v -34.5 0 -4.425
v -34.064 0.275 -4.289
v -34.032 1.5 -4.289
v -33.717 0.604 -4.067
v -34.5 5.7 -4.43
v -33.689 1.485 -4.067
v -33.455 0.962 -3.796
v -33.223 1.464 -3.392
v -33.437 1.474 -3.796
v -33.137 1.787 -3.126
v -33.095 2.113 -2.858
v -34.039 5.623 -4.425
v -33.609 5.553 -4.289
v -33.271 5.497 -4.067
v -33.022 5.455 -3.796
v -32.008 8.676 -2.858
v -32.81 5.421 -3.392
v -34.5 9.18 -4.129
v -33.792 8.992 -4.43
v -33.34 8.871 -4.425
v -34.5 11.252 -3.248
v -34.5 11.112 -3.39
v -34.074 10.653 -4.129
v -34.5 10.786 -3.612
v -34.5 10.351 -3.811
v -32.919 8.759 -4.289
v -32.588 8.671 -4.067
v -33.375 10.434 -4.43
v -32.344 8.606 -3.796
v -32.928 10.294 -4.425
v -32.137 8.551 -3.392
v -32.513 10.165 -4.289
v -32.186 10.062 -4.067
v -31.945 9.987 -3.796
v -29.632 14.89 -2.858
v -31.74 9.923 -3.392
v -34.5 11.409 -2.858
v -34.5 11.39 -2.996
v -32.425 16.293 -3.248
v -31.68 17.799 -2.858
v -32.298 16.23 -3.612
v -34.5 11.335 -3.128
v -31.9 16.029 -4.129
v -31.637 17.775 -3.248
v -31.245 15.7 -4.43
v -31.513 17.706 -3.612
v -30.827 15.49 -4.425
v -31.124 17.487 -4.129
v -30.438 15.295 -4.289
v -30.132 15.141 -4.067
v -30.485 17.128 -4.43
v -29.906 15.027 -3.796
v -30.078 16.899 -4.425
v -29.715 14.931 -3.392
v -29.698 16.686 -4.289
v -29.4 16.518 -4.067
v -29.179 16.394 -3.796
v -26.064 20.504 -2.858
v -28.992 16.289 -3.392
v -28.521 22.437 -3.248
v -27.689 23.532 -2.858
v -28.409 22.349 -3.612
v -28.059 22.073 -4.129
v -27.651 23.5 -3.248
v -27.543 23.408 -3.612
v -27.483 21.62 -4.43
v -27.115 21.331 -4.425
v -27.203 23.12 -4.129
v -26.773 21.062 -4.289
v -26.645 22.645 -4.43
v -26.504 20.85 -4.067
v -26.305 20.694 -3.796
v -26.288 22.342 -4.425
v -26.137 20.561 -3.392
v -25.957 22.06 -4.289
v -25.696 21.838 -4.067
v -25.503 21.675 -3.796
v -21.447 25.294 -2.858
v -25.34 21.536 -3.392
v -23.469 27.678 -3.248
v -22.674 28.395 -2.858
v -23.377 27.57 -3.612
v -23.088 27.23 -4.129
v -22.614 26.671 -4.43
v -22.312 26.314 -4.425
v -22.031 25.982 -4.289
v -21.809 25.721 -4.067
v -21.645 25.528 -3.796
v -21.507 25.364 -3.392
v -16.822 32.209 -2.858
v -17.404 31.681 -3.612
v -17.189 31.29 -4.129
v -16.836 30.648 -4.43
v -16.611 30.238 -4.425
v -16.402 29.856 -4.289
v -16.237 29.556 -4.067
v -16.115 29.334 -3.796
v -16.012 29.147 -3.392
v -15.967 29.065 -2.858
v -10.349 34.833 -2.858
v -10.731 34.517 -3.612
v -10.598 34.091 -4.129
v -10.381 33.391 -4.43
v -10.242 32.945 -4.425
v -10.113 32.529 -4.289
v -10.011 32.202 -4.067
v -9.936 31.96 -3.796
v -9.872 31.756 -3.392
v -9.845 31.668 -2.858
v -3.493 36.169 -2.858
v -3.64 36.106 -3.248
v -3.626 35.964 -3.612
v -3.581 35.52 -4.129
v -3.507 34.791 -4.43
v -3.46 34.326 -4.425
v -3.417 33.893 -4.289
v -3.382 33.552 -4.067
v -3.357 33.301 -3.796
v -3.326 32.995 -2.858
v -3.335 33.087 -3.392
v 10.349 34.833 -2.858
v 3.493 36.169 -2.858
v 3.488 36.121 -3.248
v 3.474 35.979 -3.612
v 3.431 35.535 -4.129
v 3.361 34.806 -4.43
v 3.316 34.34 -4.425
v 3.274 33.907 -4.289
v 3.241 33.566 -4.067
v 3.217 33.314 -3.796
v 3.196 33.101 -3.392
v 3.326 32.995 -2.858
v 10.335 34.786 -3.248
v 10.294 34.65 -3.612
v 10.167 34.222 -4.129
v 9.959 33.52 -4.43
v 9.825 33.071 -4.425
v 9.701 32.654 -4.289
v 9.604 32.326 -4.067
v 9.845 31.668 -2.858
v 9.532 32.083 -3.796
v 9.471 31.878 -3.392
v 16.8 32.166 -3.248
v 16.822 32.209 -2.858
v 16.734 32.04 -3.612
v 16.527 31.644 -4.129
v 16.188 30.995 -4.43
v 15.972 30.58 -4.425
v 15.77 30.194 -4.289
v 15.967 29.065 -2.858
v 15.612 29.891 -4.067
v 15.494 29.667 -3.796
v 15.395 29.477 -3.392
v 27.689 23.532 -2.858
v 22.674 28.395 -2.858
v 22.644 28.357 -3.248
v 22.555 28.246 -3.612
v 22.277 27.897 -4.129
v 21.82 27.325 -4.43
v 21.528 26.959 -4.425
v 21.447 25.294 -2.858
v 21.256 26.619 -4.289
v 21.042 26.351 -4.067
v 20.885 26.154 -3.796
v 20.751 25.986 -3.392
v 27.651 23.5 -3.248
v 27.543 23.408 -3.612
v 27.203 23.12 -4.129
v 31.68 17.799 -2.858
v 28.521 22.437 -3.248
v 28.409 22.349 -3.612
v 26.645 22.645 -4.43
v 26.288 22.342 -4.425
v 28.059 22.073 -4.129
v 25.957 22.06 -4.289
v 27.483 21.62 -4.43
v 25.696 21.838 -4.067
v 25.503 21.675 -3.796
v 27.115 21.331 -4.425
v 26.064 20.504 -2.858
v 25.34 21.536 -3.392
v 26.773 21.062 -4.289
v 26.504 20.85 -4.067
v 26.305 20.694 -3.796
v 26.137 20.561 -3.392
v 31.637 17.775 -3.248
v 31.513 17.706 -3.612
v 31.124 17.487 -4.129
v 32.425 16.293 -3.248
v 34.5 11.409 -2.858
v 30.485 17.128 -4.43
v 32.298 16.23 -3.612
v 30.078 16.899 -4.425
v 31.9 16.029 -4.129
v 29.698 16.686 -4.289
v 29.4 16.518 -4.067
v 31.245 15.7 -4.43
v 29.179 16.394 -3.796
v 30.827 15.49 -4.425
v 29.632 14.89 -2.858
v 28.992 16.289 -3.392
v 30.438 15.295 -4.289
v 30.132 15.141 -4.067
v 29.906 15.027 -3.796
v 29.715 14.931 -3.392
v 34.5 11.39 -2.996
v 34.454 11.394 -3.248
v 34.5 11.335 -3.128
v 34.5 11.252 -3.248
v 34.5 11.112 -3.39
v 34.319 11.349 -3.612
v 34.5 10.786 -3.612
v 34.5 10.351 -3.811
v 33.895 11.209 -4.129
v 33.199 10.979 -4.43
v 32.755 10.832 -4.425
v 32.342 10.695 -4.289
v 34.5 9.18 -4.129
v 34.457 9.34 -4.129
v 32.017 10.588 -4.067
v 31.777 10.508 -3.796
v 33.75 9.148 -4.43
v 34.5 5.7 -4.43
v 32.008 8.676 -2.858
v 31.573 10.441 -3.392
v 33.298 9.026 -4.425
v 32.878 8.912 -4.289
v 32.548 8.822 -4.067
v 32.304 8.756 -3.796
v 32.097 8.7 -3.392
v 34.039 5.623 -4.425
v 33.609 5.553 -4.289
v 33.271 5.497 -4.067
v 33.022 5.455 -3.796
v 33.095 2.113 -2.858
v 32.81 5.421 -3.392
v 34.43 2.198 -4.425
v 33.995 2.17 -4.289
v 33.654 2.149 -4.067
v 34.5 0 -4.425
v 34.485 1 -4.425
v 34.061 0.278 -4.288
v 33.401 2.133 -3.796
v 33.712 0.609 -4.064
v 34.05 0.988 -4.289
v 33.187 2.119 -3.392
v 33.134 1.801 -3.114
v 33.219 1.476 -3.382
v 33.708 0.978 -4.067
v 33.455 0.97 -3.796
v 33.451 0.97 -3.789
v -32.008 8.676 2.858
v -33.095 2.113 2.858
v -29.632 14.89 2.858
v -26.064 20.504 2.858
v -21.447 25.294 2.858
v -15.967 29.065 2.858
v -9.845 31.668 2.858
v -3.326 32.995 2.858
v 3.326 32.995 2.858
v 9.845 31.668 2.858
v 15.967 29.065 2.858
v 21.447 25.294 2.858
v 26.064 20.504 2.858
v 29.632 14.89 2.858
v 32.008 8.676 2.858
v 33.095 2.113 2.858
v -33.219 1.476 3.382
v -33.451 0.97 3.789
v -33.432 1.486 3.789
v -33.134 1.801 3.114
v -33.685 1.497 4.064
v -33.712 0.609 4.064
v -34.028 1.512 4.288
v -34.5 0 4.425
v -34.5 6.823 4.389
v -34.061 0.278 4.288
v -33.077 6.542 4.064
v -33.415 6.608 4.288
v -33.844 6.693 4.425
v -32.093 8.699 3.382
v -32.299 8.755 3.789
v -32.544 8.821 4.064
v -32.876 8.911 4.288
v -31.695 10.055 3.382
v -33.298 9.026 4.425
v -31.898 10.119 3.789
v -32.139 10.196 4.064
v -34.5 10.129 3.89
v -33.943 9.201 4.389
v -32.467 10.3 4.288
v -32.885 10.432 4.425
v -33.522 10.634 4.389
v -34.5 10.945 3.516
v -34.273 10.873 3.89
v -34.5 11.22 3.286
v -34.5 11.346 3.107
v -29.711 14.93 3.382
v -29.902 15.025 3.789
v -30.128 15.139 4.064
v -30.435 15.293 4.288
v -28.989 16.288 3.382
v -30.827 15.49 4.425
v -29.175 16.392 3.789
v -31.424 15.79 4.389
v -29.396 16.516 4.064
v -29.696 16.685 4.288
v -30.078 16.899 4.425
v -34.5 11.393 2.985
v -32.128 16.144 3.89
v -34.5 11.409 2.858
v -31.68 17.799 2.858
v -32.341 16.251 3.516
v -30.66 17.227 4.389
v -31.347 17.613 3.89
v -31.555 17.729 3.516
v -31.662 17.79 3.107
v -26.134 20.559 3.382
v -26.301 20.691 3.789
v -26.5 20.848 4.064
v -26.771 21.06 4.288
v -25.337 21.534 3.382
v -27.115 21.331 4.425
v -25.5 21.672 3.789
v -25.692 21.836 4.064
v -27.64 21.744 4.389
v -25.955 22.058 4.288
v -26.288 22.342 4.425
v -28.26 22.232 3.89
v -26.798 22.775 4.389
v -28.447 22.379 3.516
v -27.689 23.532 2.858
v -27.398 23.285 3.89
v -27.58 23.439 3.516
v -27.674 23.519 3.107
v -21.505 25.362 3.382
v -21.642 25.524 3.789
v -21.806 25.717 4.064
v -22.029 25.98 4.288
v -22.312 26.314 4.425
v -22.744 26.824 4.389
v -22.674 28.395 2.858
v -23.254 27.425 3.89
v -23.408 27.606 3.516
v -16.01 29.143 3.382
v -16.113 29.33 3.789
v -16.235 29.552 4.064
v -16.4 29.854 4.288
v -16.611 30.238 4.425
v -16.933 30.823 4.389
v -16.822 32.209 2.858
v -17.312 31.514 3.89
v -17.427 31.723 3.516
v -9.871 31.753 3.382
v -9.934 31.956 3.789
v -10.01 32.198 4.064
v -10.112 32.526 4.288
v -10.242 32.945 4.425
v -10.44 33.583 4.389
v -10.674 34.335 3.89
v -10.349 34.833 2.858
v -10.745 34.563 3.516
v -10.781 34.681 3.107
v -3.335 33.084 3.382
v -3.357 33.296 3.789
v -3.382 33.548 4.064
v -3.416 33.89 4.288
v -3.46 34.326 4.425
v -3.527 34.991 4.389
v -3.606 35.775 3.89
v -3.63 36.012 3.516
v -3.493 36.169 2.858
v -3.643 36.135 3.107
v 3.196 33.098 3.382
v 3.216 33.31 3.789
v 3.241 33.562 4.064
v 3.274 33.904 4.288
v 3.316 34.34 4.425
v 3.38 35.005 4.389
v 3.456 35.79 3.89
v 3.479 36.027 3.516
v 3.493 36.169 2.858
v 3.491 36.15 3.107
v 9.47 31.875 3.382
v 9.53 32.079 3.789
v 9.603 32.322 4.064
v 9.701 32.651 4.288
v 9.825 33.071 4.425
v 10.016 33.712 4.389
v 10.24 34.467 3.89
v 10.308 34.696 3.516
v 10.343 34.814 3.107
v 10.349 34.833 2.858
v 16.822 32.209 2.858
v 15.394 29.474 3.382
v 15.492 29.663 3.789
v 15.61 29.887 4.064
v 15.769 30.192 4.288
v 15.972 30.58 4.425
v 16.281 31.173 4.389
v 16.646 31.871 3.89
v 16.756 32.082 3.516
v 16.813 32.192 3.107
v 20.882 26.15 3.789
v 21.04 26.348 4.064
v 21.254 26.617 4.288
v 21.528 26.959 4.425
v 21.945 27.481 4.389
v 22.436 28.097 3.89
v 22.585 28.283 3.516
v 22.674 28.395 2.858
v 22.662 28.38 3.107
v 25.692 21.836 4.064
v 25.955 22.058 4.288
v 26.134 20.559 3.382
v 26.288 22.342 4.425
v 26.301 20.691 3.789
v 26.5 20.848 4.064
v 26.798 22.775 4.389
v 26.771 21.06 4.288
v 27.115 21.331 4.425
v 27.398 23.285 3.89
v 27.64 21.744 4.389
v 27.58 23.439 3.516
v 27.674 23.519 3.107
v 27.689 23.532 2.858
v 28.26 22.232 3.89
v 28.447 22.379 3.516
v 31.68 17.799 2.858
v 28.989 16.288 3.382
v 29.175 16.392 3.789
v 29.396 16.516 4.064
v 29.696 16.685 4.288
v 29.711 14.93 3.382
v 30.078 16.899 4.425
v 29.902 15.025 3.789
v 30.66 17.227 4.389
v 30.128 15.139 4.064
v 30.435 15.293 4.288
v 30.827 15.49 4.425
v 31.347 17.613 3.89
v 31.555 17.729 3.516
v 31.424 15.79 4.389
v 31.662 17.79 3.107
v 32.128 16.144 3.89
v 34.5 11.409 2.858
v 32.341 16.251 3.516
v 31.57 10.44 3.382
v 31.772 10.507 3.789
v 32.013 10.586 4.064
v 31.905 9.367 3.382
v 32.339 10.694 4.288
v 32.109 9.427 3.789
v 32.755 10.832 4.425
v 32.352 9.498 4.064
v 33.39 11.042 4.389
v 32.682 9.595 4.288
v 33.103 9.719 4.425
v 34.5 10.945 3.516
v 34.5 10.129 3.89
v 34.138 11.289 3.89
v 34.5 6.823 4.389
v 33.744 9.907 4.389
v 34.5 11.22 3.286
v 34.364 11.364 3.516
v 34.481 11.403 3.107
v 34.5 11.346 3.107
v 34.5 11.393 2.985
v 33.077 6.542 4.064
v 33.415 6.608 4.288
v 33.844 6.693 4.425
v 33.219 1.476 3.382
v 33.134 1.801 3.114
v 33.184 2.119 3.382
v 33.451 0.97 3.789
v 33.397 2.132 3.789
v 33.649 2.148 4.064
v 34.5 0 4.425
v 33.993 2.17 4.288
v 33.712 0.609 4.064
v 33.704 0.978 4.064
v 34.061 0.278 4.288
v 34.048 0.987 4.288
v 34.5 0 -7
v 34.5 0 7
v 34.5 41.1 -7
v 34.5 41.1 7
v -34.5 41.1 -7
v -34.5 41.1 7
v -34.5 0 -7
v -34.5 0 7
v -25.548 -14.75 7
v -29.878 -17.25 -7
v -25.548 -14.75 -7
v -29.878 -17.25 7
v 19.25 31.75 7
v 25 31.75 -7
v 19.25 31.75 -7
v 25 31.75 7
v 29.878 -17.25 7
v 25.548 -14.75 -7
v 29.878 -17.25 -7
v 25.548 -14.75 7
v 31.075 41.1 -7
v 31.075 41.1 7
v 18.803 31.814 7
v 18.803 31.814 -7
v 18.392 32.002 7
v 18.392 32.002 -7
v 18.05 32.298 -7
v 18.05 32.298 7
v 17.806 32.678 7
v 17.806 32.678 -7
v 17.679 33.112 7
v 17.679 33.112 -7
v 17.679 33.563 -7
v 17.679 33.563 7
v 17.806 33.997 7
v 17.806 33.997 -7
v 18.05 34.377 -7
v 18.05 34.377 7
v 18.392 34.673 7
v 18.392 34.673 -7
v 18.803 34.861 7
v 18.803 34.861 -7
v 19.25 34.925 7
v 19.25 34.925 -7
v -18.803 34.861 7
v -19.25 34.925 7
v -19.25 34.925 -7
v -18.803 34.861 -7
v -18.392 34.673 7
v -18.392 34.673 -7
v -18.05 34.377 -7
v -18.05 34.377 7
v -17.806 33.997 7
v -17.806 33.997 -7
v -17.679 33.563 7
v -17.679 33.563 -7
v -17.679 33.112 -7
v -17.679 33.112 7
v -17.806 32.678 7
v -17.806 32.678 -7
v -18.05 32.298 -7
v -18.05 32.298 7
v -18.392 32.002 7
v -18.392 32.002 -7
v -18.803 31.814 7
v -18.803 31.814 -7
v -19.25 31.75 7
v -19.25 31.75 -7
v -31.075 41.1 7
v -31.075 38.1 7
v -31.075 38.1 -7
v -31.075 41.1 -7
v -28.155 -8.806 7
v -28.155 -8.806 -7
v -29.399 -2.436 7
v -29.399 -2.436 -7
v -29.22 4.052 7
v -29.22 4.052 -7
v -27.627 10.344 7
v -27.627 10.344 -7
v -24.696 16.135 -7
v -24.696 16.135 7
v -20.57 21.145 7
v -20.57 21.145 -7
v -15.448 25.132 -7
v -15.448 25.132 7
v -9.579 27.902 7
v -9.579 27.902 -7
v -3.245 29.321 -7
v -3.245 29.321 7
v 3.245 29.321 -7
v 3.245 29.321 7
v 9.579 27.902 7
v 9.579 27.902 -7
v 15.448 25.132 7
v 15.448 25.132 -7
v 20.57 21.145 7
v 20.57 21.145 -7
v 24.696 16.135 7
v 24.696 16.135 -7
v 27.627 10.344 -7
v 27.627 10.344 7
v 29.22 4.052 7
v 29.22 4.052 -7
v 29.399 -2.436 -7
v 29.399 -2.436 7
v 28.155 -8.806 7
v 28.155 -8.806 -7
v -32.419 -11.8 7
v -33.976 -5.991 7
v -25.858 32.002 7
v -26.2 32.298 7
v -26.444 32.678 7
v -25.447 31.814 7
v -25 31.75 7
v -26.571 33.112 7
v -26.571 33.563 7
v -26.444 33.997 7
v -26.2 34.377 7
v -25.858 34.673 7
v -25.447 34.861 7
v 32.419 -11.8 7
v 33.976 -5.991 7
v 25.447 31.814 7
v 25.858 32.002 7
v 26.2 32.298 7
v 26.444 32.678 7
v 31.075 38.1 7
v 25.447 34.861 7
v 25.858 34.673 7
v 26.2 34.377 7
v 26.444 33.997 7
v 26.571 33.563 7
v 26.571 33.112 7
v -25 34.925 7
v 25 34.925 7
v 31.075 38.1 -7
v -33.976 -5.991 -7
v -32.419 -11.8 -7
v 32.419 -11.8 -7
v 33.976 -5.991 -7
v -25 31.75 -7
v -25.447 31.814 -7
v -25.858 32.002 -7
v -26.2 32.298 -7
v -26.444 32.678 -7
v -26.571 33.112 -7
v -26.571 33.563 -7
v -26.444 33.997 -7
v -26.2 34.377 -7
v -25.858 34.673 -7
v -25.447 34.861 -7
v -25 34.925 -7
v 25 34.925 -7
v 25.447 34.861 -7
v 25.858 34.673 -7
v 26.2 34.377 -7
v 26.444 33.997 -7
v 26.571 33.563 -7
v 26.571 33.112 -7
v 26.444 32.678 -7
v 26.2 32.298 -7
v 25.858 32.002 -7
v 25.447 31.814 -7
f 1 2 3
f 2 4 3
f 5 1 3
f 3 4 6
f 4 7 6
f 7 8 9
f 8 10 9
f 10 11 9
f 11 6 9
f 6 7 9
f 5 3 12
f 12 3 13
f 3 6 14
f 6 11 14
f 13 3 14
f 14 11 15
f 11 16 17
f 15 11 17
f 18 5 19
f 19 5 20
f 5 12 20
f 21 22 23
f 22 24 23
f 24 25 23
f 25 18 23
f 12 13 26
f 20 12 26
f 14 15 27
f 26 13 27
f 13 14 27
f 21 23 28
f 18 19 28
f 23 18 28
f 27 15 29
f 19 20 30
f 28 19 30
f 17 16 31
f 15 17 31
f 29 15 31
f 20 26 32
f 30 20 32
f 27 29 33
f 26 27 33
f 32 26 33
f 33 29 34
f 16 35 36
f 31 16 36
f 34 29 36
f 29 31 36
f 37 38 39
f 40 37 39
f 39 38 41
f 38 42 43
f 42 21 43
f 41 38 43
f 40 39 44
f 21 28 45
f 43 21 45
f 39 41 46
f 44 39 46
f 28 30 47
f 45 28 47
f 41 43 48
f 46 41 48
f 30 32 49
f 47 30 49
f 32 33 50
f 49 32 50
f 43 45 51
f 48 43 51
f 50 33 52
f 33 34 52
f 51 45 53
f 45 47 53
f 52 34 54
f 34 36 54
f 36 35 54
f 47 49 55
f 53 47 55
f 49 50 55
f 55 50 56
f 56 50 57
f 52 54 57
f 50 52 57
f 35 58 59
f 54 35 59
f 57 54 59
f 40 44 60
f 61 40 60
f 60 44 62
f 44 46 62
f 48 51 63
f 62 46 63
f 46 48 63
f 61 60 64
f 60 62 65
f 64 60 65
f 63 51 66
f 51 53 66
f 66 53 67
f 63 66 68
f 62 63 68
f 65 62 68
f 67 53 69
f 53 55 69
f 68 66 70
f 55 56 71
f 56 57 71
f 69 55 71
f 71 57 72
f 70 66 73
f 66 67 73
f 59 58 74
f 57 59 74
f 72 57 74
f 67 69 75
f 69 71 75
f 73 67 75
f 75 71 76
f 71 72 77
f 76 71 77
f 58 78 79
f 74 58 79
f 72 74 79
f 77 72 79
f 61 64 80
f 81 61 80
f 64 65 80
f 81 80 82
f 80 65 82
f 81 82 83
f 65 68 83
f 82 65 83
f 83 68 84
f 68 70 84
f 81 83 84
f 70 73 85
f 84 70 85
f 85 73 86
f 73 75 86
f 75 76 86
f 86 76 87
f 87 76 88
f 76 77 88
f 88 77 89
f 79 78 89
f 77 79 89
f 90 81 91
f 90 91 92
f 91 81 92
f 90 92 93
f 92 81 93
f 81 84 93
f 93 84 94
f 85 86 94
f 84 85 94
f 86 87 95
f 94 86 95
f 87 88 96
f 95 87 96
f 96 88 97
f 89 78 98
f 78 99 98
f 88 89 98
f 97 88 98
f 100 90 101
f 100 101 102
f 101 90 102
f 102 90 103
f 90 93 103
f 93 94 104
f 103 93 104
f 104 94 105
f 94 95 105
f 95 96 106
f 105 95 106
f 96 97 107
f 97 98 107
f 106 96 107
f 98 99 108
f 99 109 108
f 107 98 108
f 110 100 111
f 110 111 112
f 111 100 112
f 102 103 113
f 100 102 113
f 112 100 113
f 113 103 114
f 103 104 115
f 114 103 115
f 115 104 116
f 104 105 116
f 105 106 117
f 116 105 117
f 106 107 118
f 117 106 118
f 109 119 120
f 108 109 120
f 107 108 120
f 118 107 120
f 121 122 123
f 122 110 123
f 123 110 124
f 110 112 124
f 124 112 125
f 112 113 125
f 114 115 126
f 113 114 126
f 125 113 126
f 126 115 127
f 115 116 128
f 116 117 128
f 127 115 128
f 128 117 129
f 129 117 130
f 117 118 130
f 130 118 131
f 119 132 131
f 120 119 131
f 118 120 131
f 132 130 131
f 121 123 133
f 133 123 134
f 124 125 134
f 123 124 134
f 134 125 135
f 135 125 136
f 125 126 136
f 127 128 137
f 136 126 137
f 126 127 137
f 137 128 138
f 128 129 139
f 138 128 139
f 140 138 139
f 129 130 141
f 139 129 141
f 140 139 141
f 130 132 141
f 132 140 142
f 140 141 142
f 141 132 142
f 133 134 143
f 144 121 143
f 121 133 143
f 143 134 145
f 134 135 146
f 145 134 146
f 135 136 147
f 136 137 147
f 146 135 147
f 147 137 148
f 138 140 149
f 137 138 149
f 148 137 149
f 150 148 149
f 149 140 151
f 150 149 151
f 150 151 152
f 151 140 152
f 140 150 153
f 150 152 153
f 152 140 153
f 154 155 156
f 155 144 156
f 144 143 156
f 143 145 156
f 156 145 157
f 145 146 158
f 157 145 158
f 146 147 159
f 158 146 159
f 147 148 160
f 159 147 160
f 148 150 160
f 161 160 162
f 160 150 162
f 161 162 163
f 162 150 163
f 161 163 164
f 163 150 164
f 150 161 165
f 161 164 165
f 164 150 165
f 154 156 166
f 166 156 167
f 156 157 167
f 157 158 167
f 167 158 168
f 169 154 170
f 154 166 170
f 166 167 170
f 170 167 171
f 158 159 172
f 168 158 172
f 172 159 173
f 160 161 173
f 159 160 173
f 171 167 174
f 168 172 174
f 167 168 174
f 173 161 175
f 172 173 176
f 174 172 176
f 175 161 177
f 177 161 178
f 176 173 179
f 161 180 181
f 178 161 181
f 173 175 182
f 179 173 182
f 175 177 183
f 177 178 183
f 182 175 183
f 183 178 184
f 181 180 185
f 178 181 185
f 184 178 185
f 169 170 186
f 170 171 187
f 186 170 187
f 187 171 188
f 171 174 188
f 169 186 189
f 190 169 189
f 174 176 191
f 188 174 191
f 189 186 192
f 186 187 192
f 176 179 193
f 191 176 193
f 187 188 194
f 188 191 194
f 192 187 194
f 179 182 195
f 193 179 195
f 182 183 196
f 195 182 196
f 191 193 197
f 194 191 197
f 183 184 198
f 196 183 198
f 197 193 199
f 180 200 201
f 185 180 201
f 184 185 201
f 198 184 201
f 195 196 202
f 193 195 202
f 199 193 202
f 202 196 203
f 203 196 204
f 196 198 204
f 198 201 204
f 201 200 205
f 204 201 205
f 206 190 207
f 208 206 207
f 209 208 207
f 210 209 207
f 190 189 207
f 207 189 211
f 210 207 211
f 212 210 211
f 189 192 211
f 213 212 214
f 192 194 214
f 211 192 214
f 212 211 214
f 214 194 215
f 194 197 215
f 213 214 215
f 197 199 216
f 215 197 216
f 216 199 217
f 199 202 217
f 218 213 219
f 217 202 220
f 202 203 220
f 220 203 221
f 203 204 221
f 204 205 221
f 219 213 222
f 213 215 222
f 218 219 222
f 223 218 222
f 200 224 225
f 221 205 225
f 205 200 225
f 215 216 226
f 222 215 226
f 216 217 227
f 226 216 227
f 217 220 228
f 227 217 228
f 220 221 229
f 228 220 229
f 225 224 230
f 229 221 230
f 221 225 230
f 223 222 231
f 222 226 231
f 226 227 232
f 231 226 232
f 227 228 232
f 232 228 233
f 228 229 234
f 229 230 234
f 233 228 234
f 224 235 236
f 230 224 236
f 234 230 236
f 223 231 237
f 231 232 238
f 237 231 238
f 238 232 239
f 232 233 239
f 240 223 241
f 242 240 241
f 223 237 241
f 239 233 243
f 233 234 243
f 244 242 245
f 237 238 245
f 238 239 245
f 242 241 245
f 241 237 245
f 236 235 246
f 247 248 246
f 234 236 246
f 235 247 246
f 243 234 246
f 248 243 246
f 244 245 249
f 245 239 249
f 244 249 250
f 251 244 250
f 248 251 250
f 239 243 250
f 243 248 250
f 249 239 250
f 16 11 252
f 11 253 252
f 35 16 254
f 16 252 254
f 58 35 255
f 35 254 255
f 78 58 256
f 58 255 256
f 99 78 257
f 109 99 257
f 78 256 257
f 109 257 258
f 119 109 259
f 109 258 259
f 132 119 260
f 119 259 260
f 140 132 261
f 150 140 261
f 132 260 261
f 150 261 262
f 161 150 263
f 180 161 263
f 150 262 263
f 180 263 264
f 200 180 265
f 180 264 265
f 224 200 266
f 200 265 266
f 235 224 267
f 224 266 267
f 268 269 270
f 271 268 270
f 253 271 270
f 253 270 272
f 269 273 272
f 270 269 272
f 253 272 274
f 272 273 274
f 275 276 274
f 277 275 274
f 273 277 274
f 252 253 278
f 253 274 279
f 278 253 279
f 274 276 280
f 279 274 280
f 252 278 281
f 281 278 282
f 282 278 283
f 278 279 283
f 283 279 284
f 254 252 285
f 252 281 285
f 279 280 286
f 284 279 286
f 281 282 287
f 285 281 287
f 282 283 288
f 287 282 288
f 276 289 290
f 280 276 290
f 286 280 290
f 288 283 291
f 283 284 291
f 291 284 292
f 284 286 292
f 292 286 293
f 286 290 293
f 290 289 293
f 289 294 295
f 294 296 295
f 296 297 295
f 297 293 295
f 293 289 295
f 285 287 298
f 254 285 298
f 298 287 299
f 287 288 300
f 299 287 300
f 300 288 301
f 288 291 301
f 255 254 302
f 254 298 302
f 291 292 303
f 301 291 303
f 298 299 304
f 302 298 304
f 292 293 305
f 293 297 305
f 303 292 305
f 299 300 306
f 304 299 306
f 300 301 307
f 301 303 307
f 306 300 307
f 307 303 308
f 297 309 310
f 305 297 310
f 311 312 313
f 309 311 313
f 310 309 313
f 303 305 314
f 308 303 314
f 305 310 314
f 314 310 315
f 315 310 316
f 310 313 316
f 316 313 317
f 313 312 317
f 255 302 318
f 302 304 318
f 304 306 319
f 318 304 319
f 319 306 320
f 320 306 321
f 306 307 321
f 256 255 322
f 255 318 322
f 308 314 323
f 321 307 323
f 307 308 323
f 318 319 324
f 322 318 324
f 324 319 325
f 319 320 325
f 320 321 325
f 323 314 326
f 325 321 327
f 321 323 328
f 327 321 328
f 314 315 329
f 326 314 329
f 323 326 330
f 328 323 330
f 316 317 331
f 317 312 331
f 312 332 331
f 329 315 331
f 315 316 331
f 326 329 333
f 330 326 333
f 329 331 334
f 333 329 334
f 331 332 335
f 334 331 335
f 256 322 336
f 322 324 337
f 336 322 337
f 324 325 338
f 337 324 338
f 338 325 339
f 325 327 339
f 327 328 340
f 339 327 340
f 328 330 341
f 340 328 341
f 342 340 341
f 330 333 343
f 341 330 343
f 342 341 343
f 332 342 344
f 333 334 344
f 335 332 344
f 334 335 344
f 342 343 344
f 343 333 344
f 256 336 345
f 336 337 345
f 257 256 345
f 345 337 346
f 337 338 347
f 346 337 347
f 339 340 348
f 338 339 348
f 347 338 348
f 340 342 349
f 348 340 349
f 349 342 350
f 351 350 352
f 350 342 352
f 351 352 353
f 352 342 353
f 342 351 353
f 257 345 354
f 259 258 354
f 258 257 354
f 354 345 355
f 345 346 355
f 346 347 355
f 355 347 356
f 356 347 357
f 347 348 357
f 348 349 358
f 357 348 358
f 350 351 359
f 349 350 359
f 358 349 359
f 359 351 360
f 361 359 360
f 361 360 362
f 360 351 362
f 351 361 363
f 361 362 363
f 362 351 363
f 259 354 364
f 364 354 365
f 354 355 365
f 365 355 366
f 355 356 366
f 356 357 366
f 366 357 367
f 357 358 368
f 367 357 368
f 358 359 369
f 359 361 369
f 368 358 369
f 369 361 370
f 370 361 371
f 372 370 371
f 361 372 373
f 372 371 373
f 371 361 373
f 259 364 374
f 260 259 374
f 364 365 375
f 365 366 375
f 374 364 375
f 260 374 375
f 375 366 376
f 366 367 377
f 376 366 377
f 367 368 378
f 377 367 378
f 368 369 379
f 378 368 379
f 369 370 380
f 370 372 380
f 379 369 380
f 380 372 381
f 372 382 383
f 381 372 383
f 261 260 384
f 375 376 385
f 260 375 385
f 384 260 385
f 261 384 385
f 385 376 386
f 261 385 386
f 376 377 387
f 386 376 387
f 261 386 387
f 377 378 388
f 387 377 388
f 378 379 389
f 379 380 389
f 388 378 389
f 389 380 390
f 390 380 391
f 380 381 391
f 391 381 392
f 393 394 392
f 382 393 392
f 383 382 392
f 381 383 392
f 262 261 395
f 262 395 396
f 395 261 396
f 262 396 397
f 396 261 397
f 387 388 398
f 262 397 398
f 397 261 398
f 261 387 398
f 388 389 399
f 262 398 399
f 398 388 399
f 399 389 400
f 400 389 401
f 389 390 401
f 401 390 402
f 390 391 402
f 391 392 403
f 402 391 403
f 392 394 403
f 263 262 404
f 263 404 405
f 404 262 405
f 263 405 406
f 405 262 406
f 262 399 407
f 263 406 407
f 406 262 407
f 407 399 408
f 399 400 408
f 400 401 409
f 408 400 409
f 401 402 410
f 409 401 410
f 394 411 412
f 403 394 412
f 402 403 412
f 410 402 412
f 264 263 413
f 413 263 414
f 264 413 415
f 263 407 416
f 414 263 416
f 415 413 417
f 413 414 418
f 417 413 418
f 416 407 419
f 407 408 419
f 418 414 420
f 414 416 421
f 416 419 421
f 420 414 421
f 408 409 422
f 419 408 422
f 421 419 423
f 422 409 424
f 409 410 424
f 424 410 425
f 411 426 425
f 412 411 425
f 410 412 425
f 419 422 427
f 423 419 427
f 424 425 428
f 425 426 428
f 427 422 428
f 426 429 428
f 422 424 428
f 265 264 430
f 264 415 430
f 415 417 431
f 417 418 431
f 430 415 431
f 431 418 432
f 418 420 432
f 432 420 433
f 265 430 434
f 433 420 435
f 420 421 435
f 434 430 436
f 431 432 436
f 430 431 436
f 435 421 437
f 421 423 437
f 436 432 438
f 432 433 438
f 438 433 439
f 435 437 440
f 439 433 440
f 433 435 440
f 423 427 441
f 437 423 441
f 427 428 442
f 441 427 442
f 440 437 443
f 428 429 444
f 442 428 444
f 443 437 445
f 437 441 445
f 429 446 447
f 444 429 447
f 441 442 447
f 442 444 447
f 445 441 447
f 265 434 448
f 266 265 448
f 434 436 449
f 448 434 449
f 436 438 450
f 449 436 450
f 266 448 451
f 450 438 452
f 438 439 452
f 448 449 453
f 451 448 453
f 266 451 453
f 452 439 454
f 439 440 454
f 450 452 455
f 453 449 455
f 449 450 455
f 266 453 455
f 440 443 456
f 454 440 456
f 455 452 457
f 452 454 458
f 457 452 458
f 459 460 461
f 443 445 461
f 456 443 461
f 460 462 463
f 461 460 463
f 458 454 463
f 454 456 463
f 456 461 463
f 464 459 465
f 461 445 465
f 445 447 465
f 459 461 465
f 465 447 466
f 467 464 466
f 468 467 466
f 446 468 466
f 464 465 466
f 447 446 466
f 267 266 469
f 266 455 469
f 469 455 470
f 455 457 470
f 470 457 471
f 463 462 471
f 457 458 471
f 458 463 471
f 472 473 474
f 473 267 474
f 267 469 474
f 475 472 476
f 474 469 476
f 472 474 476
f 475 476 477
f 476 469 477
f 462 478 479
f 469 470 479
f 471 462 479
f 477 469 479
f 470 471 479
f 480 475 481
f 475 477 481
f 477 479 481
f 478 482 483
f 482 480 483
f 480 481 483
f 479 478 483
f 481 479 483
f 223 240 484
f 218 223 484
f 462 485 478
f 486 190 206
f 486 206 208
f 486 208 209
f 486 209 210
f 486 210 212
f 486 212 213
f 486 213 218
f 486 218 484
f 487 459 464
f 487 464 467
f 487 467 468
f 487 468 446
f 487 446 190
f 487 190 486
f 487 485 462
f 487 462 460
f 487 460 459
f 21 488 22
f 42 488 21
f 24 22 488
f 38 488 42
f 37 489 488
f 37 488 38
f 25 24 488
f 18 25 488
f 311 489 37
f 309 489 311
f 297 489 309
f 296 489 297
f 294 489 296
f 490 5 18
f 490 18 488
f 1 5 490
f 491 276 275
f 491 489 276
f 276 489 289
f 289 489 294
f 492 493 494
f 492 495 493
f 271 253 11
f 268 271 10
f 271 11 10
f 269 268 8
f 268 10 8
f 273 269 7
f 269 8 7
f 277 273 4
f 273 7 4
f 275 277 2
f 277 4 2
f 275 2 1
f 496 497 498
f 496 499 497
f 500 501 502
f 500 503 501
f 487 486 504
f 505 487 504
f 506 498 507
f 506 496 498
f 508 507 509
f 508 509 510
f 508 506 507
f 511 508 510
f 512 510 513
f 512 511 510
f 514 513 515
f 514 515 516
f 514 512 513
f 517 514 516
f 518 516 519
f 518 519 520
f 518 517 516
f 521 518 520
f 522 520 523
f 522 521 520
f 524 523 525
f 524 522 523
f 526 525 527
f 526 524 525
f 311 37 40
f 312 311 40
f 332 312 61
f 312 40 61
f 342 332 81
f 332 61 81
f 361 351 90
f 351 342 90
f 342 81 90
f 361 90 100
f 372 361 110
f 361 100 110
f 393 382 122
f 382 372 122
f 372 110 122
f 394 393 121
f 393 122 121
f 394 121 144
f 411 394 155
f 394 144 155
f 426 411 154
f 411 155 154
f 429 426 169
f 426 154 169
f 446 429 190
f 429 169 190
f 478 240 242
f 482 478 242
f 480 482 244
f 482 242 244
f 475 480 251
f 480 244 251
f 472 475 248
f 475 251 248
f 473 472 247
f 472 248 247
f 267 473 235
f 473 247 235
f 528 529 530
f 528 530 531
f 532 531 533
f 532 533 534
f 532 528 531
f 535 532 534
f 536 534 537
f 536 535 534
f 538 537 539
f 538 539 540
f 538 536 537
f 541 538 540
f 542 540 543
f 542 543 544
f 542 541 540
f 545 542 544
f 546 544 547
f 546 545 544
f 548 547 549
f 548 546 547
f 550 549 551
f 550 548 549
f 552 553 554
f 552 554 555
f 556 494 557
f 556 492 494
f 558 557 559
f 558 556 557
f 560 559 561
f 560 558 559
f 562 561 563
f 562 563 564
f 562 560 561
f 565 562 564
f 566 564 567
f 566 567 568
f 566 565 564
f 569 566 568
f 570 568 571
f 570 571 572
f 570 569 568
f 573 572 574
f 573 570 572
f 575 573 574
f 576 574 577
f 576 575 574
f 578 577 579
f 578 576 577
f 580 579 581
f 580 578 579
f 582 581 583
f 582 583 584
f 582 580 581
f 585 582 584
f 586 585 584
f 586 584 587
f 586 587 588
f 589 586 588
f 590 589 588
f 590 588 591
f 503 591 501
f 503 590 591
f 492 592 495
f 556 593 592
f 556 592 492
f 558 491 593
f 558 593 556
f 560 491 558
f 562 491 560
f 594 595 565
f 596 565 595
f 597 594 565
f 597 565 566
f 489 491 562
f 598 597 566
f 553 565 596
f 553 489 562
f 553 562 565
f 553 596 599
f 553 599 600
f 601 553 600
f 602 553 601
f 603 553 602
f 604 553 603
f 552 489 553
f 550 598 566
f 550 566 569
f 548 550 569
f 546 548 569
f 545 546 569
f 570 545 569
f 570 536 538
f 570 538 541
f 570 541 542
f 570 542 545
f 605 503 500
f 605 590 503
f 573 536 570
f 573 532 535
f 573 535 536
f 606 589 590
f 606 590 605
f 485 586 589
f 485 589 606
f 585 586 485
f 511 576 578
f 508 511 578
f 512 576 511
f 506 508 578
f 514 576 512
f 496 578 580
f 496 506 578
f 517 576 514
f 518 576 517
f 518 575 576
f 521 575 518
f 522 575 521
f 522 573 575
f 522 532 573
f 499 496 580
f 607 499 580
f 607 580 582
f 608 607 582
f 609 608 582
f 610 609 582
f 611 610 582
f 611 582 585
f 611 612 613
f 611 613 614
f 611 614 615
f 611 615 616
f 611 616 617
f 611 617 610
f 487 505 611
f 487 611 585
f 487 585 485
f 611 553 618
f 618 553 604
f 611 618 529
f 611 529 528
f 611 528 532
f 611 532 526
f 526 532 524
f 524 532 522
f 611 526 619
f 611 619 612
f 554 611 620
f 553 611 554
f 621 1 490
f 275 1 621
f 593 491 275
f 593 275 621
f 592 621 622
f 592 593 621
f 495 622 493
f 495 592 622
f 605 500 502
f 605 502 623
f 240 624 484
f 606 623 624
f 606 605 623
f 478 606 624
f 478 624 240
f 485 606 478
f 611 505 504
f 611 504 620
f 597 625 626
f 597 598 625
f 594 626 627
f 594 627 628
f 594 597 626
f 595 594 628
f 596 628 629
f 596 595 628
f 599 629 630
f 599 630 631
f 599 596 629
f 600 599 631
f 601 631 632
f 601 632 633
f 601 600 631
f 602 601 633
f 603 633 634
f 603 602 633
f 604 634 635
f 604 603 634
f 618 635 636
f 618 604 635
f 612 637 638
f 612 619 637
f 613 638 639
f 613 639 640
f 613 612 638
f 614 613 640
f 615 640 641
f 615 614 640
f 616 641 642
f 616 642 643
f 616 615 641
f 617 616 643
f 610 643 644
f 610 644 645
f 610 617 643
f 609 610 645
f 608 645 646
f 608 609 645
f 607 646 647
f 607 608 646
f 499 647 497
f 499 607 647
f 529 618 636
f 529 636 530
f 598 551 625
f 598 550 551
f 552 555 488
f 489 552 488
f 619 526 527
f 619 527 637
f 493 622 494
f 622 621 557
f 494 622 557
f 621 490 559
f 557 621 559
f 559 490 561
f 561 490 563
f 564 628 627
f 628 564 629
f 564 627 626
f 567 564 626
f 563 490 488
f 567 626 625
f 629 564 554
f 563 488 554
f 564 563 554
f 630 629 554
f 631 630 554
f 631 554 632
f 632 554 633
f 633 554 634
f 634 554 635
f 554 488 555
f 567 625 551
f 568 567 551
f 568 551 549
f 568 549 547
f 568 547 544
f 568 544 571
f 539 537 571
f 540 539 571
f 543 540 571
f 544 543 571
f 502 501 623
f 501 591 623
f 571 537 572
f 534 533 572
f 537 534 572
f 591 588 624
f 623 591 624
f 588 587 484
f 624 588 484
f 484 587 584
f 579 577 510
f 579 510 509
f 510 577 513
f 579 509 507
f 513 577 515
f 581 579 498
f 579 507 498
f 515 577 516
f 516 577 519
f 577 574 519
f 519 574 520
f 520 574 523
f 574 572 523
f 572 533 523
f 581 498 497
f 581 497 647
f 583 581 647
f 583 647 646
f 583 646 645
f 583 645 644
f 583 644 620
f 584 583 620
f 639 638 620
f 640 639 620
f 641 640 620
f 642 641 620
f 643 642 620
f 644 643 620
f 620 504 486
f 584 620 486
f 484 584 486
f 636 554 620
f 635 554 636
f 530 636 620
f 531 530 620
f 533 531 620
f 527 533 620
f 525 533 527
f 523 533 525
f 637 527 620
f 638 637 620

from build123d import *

# Parameters (mm, degrees)
BOSS_EXTRUDE2_DEPTH      = 7
CORTAR_REVOLUCI_N1_ANGLE = 180
REDONDEO1_START          = -5
REDONDEO1_DEPTH          = 10


with BuildPart() as part:
    # Sketch1 → Boss-Extrude2 (new, symmetric)
    with BuildSketch(Plane.XY):
        with BuildLine():
            Line((25.547749412, -14.75), (29.877876431, -17.25))
            ThreePointArc((29.877876431, -17.25), (33.324441007, -8.929257056), (34.5, 0))
            Line((34.5, 0), (34.5, 41.1))
            Line((34.5, 41.1), (31.075, 41.1))
            Line((31.075, 41.1), (31.075, 38.1))
            Line((31.075, 38.1), (-31.075, 38.1))
            Line((-31.075, 38.1), (-31.075, 41.1))
            Line((-31.075, 41.1), (-34.5, 41.1))
            Line((-34.5, 41.1), (-34.5, 0))
            ThreePointArc((-34.5, 0), (-33.324441007, -8.929257056), (-29.877876431, -17.25))
            Line((-29.877876431, -17.25), (-25.547749412, -14.75))
            ThreePointArc((-25.547749412, -14.75), (0, 29.5), (25.547749412, -14.75))
        make_face()
        with BuildLine():
            Line((-25, 34.925), (-19.25, 34.925))
            ThreePointArc((-19.25, 34.925), (-17.6625, 33.3375), (-19.25, 31.75))
            Line((-19.25, 31.75), (-25, 31.75))
            ThreePointArc((-25, 31.75), (-26.5875, 33.3375), (-25, 34.925))
        make_face(mode=Mode.SUBTRACT)
        with BuildLine():
            Line((19.25, 34.925), (25, 34.925))
            ThreePointArc((25, 34.925), (26.5875, 33.3375), (25, 31.75))
            Line((25, 31.75), (19.25, 31.75))
            ThreePointArc((19.25, 31.75), (17.6625, 33.3375), (19.25, 34.925))
        make_face(mode=Mode.SUBTRACT)
    extrude(amount=BOSS_EXTRUDE2_DEPTH, both=True)

    # Croquis1 → Cortar-Revolución1 (revolve, symmetric, cut)
    with BuildSketch(Plane(origin=(0, 0, 0), x_dir=(0, 0, -1), z_dir=(1, 0, 0))) as cortar_revoluci_n1_sk:
        with BuildLine():
            Line((-2.8575, 36.3375), (2.8575, 36.3375))
            ThreePointArc((2.8575, 36.3375), (4.445, 34.75), (2.8575, 33.1625))
            Line((2.8575, 33.1625), (-2.8575, 33.1625))
            ThreePointArc((-2.8575, 33.1625), (-4.445, 34.75), (-2.8575, 36.3375))
        make_face()
    revolve(axis=Axis((0, 0, 0), (0, 0, 1)), revolution_arc=CORTAR_REVOLUCI_N1_ANGLE / 2, mode=Mode.SUBTRACT)
    revolve(cortar_revoluci_n1_sk.sketch, axis=Axis((0, 0, 0), (0, 0, -1)), revolution_arc=CORTAR_REVOLUCI_N1_ANGLE / 2, mode=Mode.SUBTRACT)

    # Redondeo1: read off the stored shape, not the designer's step
    # Redondeo1 outline → Redondeo1 (add)
    with BuildSketch(Plane.XY.offset(REDONDEO1_START)):
        with BuildLine():
            ThreePointArc((34.5, 0), (33.514807302, 0.868494137), (33.095116255, 2.112980435))
            ThreePointArc((33.095116255, 2.112980435), (33.145649783, 1.057027304), (33.1625, 0))
            Line((33.1625, 0), (34.5, 0))
        make_face()
        with BuildLine():
            ThreePointArc((-33.095116255, 2.112980435), (-33.514807302, 0.868494137), (-34.5, 0))
            Line((-34.5, 0), (-33.1625, 0))
            ThreePointArc((-33.1625, 0), (-33.145649783, 1.057027304), (-33.095116255, 2.112980435))
        make_face()
    extrude(amount=REDONDEO1_DEPTH)


solid = part.part
